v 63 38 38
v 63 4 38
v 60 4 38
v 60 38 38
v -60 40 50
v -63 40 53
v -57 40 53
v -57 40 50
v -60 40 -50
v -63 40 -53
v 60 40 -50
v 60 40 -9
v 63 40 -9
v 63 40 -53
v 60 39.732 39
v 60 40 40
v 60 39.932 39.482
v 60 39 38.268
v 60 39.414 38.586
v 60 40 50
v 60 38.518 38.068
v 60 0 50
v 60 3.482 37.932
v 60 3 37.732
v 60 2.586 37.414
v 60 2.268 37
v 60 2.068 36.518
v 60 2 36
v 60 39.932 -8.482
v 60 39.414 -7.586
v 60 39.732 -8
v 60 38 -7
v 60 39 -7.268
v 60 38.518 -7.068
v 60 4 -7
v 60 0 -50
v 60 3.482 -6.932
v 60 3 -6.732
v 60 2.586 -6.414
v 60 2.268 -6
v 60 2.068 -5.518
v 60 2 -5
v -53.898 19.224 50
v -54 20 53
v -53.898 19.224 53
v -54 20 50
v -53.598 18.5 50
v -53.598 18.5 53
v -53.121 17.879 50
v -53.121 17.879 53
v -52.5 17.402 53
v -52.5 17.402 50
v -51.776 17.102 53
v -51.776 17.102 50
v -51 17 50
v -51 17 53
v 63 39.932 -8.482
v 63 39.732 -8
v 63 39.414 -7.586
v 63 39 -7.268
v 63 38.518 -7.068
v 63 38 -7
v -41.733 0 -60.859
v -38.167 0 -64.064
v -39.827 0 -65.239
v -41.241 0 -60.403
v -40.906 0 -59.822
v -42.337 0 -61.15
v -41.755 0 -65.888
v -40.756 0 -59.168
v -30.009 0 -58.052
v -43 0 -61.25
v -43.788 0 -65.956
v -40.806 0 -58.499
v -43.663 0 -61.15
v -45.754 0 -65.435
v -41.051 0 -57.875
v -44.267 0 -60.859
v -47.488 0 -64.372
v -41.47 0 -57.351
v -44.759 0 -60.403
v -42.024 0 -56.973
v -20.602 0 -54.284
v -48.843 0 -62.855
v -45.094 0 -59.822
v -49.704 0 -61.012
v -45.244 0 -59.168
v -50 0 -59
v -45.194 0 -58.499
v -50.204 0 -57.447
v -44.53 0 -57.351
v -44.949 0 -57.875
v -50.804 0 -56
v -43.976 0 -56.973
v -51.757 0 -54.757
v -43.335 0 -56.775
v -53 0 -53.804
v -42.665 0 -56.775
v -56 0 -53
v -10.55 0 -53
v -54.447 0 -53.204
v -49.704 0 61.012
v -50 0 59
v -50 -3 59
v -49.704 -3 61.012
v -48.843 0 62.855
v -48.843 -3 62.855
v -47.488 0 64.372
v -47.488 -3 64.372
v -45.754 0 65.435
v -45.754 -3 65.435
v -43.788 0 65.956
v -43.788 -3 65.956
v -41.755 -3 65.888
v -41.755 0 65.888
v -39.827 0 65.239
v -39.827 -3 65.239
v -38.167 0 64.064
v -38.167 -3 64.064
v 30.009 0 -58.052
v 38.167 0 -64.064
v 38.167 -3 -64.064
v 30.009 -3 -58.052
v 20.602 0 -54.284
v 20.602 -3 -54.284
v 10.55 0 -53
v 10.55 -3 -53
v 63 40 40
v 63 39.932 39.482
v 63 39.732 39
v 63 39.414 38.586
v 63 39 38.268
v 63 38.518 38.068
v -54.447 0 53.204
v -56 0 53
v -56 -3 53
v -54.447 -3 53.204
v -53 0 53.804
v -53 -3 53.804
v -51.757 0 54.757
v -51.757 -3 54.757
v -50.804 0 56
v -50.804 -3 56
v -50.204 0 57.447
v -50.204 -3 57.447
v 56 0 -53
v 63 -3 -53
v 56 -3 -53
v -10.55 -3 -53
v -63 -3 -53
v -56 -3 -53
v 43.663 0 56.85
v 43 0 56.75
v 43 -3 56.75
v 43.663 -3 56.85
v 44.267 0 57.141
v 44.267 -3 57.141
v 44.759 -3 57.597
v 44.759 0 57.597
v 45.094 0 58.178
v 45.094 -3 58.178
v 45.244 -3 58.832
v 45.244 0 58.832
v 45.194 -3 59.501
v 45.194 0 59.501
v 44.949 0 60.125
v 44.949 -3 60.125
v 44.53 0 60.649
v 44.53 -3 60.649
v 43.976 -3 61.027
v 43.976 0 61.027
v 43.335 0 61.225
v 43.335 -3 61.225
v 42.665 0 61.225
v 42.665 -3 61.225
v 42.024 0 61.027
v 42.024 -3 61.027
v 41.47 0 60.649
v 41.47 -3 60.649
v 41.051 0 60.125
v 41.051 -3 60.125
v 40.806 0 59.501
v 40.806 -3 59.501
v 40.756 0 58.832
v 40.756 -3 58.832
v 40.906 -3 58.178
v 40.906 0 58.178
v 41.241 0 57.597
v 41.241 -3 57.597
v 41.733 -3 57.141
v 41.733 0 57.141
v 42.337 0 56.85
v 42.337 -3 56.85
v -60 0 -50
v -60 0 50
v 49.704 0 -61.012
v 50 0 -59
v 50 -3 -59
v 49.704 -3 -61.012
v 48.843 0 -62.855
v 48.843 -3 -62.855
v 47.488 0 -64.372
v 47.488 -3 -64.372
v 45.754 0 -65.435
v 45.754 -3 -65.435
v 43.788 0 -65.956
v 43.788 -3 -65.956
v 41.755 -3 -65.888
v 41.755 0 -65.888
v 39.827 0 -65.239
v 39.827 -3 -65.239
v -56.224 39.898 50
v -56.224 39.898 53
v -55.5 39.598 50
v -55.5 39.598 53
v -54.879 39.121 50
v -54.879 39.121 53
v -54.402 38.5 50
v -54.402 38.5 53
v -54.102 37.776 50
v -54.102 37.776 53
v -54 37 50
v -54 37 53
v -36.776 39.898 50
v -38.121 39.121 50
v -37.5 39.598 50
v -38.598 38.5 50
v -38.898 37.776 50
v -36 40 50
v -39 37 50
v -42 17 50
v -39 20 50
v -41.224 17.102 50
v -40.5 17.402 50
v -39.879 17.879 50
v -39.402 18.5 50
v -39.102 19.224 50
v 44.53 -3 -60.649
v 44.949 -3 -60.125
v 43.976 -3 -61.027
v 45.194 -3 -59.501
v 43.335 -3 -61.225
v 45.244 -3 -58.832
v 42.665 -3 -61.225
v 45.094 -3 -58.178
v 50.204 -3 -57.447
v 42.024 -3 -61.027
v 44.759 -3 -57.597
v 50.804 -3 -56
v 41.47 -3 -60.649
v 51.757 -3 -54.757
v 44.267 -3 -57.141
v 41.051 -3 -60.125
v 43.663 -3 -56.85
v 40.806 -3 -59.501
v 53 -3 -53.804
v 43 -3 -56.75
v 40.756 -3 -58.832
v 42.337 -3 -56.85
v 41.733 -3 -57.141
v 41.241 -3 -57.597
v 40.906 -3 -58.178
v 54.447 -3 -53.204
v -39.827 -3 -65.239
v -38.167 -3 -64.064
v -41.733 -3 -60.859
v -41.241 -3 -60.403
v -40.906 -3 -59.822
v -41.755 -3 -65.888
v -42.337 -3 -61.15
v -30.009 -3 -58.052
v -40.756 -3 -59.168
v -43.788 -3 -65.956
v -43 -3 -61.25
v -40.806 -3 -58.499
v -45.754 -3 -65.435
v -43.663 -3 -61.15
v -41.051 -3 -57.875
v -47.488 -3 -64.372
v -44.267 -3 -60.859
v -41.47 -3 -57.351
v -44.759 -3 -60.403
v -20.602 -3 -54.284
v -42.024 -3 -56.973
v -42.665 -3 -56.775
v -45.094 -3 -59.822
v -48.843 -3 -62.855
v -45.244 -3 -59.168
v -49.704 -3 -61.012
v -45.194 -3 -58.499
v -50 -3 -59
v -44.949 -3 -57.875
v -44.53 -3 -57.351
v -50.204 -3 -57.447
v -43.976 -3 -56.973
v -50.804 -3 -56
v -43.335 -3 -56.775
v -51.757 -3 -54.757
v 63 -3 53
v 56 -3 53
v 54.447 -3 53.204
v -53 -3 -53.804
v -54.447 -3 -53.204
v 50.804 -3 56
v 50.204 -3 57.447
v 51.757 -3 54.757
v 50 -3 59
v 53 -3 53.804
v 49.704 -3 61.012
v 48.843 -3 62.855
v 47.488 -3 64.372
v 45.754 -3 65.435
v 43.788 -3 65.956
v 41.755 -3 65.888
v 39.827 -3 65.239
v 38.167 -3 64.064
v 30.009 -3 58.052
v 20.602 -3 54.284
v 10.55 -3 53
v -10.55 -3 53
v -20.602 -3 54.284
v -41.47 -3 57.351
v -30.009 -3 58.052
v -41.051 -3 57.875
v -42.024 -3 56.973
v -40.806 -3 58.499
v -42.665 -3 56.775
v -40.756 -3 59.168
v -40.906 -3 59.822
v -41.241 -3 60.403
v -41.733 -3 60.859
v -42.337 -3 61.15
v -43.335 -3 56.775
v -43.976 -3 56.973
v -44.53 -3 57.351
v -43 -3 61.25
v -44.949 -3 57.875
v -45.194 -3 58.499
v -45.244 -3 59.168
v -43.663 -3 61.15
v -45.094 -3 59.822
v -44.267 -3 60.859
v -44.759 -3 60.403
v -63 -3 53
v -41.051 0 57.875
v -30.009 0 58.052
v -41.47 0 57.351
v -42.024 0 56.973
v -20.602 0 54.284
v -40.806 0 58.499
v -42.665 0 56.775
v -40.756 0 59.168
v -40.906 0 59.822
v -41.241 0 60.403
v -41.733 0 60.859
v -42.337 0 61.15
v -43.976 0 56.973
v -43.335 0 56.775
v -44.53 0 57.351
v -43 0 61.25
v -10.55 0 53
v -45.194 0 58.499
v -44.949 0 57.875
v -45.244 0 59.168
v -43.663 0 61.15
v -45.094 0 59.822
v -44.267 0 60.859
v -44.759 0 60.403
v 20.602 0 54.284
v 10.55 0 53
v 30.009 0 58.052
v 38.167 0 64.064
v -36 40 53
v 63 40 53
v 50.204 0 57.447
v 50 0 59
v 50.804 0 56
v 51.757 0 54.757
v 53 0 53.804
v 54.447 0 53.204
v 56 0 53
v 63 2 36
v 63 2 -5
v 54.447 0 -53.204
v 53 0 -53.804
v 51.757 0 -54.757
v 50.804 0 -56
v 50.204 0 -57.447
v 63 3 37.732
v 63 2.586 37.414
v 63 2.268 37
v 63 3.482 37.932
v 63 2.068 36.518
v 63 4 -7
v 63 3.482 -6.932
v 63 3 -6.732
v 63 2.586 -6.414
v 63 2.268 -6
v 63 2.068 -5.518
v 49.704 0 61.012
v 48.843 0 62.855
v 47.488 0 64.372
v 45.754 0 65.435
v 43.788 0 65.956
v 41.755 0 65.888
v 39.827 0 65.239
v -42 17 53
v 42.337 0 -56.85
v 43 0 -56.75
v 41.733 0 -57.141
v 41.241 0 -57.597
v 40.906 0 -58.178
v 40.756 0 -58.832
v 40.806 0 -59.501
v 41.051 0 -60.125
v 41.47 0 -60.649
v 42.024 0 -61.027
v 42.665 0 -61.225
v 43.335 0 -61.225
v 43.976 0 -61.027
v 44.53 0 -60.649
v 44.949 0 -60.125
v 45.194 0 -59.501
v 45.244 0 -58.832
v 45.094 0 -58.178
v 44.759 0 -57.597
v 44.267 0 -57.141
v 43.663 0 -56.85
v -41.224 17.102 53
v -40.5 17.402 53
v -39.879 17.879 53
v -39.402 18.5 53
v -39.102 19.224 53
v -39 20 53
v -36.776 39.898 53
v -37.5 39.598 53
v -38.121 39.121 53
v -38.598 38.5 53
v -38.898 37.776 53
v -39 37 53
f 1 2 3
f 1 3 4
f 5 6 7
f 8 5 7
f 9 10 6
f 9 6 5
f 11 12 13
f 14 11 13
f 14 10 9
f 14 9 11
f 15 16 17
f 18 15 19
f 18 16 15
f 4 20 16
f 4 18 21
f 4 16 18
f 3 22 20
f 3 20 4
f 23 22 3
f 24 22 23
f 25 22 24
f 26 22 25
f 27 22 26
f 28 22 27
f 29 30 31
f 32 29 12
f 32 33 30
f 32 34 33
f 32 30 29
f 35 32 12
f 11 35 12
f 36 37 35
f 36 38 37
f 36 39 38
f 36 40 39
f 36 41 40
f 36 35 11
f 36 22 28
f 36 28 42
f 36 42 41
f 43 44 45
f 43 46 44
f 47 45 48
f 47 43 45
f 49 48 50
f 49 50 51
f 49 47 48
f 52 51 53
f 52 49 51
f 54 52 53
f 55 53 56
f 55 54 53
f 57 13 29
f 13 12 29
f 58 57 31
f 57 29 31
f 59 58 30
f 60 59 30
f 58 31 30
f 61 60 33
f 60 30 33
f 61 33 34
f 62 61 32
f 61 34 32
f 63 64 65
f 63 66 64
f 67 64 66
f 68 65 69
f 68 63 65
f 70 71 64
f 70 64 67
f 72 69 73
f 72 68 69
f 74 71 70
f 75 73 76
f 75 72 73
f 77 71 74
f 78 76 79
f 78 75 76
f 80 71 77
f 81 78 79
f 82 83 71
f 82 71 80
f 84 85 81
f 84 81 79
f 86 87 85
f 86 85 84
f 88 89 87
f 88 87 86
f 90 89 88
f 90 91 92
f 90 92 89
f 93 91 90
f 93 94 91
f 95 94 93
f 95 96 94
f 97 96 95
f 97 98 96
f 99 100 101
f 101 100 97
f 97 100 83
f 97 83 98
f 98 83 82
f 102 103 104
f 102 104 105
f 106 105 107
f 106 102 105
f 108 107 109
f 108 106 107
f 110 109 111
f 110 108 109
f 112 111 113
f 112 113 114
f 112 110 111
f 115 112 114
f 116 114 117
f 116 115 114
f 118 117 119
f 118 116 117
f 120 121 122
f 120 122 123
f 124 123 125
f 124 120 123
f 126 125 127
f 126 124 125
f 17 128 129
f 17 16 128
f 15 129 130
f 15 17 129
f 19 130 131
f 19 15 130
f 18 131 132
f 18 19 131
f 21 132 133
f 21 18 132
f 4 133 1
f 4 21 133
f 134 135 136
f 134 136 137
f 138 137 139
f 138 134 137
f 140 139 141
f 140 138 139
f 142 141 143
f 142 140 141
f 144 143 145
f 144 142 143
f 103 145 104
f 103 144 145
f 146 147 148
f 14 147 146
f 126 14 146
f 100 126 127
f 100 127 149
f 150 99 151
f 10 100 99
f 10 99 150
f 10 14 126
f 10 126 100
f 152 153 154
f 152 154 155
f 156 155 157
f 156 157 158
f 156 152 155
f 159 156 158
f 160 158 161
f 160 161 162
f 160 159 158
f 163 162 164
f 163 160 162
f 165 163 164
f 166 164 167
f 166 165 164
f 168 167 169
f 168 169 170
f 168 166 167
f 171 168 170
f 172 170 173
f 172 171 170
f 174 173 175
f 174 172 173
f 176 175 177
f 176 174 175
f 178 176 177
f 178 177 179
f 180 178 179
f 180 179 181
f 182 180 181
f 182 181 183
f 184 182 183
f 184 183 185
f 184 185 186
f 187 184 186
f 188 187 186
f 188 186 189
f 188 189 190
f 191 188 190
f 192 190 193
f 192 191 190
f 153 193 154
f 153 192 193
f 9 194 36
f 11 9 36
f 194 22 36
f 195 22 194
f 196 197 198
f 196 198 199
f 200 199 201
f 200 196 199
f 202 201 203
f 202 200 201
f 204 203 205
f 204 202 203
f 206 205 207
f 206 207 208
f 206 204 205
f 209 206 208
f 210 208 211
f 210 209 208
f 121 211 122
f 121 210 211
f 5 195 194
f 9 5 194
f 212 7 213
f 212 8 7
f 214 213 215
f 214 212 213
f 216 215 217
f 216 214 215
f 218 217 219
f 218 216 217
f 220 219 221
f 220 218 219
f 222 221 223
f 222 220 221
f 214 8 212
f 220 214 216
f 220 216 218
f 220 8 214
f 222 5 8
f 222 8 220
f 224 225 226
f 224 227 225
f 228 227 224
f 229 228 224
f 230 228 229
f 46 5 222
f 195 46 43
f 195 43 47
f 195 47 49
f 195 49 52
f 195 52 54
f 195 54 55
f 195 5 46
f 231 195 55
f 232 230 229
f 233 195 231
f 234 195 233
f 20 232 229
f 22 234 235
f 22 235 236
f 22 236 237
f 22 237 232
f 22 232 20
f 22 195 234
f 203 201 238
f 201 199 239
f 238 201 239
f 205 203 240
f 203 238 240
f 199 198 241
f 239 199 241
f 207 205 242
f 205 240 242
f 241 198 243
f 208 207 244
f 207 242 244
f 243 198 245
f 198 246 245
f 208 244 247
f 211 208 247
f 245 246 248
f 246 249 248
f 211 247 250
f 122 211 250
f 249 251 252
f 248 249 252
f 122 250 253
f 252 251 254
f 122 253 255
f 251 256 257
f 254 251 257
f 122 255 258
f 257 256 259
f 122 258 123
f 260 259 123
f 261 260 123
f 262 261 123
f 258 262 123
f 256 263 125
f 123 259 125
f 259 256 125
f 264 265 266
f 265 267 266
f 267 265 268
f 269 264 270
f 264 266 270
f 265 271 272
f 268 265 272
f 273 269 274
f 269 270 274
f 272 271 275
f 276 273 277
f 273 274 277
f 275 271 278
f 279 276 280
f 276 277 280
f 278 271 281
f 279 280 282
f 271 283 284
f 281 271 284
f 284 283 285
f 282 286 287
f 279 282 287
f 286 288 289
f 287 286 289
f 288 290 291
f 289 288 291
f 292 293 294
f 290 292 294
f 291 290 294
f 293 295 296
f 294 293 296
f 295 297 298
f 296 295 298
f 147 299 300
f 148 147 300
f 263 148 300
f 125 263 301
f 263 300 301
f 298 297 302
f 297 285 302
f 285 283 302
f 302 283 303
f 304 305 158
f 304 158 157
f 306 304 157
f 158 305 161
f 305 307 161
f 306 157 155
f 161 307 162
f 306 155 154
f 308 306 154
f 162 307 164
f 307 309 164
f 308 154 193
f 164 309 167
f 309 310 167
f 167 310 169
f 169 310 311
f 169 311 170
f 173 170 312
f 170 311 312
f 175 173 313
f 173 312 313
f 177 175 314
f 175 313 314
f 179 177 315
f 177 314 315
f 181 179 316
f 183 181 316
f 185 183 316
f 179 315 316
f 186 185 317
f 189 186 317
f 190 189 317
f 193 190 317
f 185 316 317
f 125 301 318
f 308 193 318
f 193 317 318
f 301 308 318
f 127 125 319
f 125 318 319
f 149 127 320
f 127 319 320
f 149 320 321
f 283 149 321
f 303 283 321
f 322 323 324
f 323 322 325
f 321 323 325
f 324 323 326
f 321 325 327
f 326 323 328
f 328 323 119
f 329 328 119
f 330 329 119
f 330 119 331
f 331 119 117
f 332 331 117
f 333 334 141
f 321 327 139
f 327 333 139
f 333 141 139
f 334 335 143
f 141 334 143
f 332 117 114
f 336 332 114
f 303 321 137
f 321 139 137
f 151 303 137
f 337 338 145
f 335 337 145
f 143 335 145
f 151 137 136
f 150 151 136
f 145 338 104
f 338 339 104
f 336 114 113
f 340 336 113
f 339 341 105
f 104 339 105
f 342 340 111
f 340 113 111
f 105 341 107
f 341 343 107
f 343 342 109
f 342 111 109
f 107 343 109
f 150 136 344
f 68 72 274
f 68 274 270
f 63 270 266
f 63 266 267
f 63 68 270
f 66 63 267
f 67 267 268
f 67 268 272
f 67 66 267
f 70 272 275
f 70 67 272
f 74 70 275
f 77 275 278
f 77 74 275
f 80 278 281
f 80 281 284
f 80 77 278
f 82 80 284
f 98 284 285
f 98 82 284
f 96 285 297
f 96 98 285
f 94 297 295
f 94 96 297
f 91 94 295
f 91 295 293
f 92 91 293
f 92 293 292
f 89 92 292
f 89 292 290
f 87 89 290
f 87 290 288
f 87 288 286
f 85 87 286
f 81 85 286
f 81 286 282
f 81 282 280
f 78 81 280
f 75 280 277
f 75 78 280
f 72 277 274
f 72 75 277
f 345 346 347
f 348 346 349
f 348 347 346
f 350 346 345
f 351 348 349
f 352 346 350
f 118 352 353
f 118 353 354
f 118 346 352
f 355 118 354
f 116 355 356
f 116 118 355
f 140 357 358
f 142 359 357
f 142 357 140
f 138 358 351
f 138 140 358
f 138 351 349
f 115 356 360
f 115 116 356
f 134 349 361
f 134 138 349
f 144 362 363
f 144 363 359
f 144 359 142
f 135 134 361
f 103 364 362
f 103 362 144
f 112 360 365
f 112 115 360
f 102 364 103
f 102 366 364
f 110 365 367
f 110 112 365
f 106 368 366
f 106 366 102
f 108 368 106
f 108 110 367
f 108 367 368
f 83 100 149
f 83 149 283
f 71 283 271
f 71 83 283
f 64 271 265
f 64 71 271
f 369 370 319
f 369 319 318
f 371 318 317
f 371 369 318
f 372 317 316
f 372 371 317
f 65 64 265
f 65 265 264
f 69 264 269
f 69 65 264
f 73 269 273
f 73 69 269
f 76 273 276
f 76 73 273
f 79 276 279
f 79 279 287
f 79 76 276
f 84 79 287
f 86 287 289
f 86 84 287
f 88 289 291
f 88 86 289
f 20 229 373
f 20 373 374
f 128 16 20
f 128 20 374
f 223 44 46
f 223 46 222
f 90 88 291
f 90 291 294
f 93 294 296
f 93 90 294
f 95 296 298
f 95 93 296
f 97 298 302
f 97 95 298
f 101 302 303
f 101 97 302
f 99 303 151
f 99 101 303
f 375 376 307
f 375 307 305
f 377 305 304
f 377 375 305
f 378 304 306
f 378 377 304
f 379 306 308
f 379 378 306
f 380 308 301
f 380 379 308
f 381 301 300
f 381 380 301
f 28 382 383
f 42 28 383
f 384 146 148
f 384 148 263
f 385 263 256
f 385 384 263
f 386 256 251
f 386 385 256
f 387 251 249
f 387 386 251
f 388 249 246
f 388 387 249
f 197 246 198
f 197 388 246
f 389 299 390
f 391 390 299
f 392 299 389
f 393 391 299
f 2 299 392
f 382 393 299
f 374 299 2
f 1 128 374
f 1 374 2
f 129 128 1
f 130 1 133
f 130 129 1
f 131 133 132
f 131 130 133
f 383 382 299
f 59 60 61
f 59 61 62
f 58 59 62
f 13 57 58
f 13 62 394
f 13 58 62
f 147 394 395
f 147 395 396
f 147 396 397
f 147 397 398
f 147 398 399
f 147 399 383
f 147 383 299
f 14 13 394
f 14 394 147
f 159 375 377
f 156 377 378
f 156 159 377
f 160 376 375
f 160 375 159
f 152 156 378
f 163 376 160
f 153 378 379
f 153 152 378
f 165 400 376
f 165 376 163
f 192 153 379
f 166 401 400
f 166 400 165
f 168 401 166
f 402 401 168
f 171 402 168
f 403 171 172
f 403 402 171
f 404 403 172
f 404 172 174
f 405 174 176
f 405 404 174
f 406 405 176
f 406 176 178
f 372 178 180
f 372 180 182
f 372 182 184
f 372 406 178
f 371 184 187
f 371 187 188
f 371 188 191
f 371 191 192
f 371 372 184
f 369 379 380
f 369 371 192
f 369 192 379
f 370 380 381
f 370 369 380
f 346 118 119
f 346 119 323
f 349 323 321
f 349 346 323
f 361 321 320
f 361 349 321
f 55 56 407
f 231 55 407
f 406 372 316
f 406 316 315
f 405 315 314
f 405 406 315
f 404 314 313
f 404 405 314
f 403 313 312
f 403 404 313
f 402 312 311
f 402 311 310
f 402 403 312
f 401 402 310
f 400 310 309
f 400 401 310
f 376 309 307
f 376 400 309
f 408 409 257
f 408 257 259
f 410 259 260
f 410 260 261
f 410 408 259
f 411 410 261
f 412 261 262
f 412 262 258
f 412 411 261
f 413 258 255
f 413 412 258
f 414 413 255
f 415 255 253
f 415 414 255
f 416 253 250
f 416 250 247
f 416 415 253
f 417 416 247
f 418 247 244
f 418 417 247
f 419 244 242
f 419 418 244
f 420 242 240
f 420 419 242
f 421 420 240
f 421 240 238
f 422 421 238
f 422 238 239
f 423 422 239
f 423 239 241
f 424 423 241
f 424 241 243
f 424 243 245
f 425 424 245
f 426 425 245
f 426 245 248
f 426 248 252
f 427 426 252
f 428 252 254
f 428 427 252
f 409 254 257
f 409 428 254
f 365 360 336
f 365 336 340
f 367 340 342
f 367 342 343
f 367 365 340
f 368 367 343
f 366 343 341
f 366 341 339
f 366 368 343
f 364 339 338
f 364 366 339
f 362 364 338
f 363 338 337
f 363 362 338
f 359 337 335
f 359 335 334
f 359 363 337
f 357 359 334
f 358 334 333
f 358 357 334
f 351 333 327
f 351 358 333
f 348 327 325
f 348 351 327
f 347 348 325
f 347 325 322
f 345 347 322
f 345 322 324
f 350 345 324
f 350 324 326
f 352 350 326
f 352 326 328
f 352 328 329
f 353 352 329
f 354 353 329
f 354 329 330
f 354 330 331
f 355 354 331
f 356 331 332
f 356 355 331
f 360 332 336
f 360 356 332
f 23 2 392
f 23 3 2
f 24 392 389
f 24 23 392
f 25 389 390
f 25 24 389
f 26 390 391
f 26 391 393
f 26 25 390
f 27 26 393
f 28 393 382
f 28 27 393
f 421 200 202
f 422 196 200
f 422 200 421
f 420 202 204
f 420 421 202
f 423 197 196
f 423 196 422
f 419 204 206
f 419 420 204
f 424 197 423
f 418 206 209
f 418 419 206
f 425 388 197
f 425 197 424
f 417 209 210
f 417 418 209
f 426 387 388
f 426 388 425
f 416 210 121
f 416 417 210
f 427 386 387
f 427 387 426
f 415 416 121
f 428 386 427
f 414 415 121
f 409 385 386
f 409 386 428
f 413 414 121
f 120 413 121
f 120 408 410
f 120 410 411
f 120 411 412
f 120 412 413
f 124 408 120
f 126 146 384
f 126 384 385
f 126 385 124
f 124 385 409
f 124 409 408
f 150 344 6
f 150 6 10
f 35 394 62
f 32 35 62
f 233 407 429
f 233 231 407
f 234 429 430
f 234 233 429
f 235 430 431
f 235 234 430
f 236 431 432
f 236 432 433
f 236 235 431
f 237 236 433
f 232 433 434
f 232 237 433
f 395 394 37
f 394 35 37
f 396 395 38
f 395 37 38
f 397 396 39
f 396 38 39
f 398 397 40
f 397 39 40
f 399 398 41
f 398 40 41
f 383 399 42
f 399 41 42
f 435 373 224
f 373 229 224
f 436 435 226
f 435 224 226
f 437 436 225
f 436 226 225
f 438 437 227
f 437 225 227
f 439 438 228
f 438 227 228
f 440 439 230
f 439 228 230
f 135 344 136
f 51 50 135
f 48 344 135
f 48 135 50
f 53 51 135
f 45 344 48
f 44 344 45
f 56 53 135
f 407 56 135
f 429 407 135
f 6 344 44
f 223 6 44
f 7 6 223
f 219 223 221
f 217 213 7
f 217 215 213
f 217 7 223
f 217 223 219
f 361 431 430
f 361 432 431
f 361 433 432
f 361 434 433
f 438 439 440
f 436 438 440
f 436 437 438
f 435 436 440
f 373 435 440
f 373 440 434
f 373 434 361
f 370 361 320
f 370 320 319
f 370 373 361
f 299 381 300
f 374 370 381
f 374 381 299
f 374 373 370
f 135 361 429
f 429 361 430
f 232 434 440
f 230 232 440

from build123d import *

# Parameters (mm, degrees)
SKETCH1_W           = 126
SKETCH1_H           = 106
SKETCH1_W_2         = 120
SKETCH1_H_2         = 100
BOSS_EXTRUDE1_DEPTH = 40
SKETCH2_R           = 2.25
BOSS_EXTRUDE2_DEPTH = 3
SKETCH3_W           = 15
SKETCH3_H           = 23
CUT_EXTRUDE1_DEPTH  = 3
FILLET1_R           = 3
SKETCH4_W           = 45
SKETCH4_H           = 38
CUT_EXTRUDE2_DEPTH  = 3
FILLET2_R           = 2


with BuildPart() as part:
    # Sketch1 → Boss-Extrude1 (new body)
    with BuildSketch(Plane(origin=(0, 0, 0), x_dir=(1, 0, 0), z_dir=(0, 1, 0))):
        Rectangle(SKETCH1_W, SKETCH1_H)
        Rectangle(SKETCH1_W_2, SKETCH1_H_2, mode=Mode.SUBTRACT)
    extrude(amount=BOSS_EXTRUDE1_DEPTH)

    # Sketch2 → Boss-Extrude2 (add)
    with BuildSketch(Plane.XZ):
        with BuildLine():
            Line((56, 53), (63, 53))
            Line((63, 53), (63, -53))
            Line((63, -53), (56, -53))
            ThreePointArc((56, -53), (51.757359313, -54.757359313), (50, -59))
            ThreePointArc((50, -59), (45.754014261, -65.435480204), (38.167027014, -64.063829787))
            ThreePointArc((38.167027014, -64.063829787), (25.425407281, -55.868835135), (10.550038521, -53))
            Line((10.550038521, -53), (-10.550038521, -53))
            ThreePointArc((-10.550038521, -53), (-25.425407281, -55.868835135), (-38.167027014, -64.063829787))
            ThreePointArc((-38.167027014, -64.063829787), (-45.754014261, -65.435480204), (-50, -59))
            ThreePointArc((-50, -59), (-51.757359313, -54.757359313), (-56, -53))
            Line((-56, -53), (-63, -53))
            Line((-63, -53), (-63, 53))
            Line((-63, 53), (-56, 53))
            ThreePointArc((-56, 53), (-51.757359313, 54.757359313), (-50, 59))
            ThreePointArc((-50, 59), (-45.754014261, 65.435480204), (-38.167027014, 64.063829787))
            ThreePointArc((-38.167027014, 64.063829787), (-25.425407281, 55.868835135), (-10.550038521, 53))
            Line((-10.550038521, 53), (10.550038521, 53))
            ThreePointArc((10.550038521, 53), (25.425407281, 55.868835135), (38.167027014, 64.063829787))
            ThreePointArc((38.167027014, 64.063829787), (45.754014261, 65.435480204), (50, 59))
            ThreePointArc((50, 59), (51.757359313, 54.757359313), (56, 53))
        make_face()
        with Locations(Location((43, 59, 0), (0, 0, 270))):
            Circle(SKETCH2_R, mode=Mode.SUBTRACT)
        with Locations(Location((43, -59, 0), (0, 0, 90))):
            Circle(SKETCH2_R, mode=Mode.SUBTRACT)
        with Locations(Location((-43, -59, 0), (0, 0, 270))):
            Circle(SKETCH2_R, mode=Mode.SUBTRACT)
        with Locations(Location((-43, 59, 0), (0, 0, 90))):
            Circle(SKETCH2_R, mode=Mode.SUBTRACT)
    extrude(amount=BOSS_EXTRUDE2_DEPTH)

    # Sketch3 → Cut-Extrude1 (cut)
    with BuildSketch(Plane.XY.offset(53)):
        with Locations((-46.5, 28.5)):
            Rectangle(SKETCH3_W, SKETCH3_H)
    extrude(amount=-CUT_EXTRUDE1_DEPTH, mode=Mode.SUBTRACT)

    # Fillet1
    fillet1_edges = [part.edges().sort_by_distance(p)[0] for p in [
        (-54, 17, 51.5),
        (-54, 40, 51.5),
        (-39, 40, 51.5),
        (-39, 17, 51.5),
    ]]
    fillet(fillet1_edges, radius=FILLET1_R)

    # Sketch4 → Cut-Extrude2 (cut)
    with BuildSketch(Plane(origin=(63, 0, 0), x_dir=(0, 0, -1), z_dir=(1, 0, 0))):
        with Locations((-15.5, 21)):
            Rectangle(SKETCH4_W, SKETCH4_H)
    extrude(amount=-CUT_EXTRUDE2_DEPTH, mode=Mode.SUBTRACT)

    # Fillet2
    fillet2_edges = [part.edges().sort_by_distance(p)[0] for p in [
        (61.5, 2, 38),
        (61.5, 40, 38),
        (61.5, 40, -7),
        (61.5, 2, -7),
    ]]
    fillet(fillet2_edges, radius=FILLET2_R)


solid = part.part
